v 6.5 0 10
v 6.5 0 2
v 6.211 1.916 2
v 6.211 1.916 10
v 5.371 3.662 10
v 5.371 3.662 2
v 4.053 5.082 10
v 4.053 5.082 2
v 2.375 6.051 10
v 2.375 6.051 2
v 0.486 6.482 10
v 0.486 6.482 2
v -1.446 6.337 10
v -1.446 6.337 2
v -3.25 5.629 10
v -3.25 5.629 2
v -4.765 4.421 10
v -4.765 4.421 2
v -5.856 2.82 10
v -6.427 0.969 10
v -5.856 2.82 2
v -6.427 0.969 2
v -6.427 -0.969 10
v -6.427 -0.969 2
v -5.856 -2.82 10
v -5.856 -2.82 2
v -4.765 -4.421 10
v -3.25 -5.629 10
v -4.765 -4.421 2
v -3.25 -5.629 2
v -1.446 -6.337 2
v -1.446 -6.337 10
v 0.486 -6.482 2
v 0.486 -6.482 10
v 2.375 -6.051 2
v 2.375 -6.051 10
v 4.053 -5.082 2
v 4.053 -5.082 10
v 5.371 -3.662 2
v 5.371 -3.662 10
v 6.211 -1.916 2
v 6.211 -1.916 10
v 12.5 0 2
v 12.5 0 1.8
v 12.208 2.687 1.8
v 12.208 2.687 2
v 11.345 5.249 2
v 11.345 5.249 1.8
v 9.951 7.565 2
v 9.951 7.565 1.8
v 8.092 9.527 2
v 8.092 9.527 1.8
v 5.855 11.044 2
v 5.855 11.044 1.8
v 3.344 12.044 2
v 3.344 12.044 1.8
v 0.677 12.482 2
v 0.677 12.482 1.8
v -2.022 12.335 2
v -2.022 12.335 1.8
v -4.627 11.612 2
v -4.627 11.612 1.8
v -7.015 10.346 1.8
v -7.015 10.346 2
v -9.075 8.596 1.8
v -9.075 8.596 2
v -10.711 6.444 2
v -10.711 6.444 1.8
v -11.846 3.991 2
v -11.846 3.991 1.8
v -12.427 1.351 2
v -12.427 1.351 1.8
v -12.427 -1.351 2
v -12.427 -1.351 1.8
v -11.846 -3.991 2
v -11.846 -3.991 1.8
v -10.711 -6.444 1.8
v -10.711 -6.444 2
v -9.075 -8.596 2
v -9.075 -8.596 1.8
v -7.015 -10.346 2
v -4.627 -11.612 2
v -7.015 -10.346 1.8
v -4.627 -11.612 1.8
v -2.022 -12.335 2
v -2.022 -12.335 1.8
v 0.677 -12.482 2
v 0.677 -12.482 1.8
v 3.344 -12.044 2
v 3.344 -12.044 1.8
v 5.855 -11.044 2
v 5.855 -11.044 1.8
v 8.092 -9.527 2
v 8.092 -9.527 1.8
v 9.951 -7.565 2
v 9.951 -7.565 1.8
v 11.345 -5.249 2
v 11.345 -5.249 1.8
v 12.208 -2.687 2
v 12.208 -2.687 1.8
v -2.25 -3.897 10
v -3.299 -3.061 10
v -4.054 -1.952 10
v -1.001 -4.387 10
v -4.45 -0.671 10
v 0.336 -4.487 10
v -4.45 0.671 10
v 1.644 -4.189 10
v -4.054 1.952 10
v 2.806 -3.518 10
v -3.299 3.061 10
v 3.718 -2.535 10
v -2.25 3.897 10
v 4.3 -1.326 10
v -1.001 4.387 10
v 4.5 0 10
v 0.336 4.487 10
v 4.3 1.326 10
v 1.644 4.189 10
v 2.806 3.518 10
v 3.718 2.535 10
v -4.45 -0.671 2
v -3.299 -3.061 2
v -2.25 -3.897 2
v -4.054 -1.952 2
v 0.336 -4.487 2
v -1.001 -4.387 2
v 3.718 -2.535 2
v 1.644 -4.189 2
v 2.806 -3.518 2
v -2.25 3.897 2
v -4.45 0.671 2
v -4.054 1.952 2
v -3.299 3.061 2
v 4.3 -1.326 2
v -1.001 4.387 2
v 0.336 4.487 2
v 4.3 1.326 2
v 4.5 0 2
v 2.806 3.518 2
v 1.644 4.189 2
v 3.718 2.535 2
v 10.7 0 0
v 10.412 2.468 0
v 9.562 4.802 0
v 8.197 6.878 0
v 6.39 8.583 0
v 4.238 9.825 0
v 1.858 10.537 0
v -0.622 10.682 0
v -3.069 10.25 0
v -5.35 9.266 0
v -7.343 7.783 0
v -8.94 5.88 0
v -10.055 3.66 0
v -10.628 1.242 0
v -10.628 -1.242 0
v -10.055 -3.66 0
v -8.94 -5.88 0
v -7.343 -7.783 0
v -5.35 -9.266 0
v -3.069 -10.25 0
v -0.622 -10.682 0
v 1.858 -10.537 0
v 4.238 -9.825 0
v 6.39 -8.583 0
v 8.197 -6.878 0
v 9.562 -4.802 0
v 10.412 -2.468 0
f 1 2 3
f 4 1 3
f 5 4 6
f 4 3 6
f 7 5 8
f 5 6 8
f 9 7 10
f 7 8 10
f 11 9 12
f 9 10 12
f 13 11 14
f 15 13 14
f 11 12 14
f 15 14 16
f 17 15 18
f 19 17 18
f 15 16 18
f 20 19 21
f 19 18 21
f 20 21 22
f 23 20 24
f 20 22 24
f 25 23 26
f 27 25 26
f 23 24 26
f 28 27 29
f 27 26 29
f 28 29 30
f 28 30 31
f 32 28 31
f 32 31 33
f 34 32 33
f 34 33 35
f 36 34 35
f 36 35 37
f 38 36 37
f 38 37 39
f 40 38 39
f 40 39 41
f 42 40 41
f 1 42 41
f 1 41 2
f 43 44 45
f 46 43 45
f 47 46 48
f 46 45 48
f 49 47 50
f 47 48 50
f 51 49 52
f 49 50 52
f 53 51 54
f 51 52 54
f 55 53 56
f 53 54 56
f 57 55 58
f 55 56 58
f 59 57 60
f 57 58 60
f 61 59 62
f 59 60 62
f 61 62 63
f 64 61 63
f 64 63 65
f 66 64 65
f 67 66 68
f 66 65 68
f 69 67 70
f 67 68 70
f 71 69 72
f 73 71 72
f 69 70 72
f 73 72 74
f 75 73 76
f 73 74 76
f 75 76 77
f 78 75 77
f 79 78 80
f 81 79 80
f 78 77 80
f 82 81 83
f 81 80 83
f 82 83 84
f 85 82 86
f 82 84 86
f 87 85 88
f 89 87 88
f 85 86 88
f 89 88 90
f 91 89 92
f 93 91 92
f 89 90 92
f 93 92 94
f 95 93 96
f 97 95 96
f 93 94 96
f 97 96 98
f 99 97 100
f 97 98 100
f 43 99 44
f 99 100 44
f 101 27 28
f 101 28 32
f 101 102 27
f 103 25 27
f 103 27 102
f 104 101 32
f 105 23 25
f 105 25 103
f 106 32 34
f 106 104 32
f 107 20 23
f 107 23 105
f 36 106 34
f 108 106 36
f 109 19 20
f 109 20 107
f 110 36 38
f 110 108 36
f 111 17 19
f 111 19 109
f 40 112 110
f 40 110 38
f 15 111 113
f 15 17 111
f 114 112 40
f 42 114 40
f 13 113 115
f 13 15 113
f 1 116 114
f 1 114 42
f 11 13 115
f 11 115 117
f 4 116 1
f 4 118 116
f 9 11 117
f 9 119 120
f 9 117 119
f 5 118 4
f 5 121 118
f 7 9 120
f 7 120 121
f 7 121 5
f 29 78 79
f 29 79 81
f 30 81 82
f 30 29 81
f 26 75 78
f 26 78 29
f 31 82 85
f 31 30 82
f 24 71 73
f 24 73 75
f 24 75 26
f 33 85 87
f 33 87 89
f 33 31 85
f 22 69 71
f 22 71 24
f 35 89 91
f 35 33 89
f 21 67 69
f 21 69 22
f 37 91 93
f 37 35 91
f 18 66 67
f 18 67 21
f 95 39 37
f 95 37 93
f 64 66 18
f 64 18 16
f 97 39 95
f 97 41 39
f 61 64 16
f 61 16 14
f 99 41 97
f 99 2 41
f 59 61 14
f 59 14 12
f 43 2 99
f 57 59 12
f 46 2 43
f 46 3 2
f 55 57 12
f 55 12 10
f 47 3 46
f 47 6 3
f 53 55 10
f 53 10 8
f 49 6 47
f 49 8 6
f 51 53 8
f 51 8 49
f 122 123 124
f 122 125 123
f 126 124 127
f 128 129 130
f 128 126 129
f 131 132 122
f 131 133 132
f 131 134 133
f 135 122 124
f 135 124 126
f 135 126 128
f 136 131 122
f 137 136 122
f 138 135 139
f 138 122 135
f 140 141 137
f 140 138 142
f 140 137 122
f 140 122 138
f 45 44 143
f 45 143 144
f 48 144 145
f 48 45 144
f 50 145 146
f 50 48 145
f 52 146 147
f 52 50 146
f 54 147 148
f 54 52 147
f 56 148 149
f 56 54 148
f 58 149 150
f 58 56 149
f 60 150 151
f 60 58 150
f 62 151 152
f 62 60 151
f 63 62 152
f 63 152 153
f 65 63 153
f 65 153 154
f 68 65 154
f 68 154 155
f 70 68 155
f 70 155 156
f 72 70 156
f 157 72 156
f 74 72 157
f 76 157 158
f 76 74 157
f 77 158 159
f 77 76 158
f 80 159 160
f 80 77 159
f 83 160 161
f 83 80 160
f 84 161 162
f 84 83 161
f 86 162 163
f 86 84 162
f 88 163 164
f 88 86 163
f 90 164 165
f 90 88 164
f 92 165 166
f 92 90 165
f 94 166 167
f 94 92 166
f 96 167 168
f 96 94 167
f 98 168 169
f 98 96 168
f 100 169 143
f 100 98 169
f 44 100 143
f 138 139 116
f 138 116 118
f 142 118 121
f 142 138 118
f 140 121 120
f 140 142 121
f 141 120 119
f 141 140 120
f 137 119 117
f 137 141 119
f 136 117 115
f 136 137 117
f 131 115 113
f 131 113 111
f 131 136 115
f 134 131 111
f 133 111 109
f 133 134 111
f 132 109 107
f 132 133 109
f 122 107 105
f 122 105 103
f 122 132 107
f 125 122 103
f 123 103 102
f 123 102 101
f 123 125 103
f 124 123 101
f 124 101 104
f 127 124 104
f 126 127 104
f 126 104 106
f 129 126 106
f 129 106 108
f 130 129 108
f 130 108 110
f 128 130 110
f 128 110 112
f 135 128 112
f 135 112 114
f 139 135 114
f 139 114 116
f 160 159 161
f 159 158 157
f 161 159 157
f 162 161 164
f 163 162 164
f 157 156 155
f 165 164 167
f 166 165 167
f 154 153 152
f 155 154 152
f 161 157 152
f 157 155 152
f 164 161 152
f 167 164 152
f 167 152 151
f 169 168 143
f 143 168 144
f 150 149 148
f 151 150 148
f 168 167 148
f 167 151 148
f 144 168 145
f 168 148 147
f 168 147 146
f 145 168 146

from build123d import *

# Parameters (mm, degrees)
F0_R     = 12.5
F0_R_2   = 6.5
F0_R_3   = 4.5
F1_DEPTH = 2
F2_DEPTH = 10
F3_SIZE  = 1.8


with BuildPart() as f1:
    # F0 (on Top) → F1 (new body)
    with BuildSketch(Plane.XY):
        Circle(F0_R)
        Circle(F0_R_2, mode=Mode.SUBTRACT)
        Circle(F0_R_2)
        Circle(F0_R_3, mode=Mode.SUBTRACT)
        Circle(F0_R_3)
    extrude(amount=F1_DEPTH)

    # F0 (on Top) → F2 (join)
    with BuildSketch(Plane.XY):
        Circle(F0_R_2)
        Circle(F0_R_3, mode=Mode.SUBTRACT)
    extrude(amount=F2_DEPTH)

    # F3
    f3_edges = [f1.edges().sort_by_distance(p)[0] for p in [
        (-12.5, 0, 0),
    ]]
    chamfer(f3_edges, length=F3_SIZE)


solid = f1.part
